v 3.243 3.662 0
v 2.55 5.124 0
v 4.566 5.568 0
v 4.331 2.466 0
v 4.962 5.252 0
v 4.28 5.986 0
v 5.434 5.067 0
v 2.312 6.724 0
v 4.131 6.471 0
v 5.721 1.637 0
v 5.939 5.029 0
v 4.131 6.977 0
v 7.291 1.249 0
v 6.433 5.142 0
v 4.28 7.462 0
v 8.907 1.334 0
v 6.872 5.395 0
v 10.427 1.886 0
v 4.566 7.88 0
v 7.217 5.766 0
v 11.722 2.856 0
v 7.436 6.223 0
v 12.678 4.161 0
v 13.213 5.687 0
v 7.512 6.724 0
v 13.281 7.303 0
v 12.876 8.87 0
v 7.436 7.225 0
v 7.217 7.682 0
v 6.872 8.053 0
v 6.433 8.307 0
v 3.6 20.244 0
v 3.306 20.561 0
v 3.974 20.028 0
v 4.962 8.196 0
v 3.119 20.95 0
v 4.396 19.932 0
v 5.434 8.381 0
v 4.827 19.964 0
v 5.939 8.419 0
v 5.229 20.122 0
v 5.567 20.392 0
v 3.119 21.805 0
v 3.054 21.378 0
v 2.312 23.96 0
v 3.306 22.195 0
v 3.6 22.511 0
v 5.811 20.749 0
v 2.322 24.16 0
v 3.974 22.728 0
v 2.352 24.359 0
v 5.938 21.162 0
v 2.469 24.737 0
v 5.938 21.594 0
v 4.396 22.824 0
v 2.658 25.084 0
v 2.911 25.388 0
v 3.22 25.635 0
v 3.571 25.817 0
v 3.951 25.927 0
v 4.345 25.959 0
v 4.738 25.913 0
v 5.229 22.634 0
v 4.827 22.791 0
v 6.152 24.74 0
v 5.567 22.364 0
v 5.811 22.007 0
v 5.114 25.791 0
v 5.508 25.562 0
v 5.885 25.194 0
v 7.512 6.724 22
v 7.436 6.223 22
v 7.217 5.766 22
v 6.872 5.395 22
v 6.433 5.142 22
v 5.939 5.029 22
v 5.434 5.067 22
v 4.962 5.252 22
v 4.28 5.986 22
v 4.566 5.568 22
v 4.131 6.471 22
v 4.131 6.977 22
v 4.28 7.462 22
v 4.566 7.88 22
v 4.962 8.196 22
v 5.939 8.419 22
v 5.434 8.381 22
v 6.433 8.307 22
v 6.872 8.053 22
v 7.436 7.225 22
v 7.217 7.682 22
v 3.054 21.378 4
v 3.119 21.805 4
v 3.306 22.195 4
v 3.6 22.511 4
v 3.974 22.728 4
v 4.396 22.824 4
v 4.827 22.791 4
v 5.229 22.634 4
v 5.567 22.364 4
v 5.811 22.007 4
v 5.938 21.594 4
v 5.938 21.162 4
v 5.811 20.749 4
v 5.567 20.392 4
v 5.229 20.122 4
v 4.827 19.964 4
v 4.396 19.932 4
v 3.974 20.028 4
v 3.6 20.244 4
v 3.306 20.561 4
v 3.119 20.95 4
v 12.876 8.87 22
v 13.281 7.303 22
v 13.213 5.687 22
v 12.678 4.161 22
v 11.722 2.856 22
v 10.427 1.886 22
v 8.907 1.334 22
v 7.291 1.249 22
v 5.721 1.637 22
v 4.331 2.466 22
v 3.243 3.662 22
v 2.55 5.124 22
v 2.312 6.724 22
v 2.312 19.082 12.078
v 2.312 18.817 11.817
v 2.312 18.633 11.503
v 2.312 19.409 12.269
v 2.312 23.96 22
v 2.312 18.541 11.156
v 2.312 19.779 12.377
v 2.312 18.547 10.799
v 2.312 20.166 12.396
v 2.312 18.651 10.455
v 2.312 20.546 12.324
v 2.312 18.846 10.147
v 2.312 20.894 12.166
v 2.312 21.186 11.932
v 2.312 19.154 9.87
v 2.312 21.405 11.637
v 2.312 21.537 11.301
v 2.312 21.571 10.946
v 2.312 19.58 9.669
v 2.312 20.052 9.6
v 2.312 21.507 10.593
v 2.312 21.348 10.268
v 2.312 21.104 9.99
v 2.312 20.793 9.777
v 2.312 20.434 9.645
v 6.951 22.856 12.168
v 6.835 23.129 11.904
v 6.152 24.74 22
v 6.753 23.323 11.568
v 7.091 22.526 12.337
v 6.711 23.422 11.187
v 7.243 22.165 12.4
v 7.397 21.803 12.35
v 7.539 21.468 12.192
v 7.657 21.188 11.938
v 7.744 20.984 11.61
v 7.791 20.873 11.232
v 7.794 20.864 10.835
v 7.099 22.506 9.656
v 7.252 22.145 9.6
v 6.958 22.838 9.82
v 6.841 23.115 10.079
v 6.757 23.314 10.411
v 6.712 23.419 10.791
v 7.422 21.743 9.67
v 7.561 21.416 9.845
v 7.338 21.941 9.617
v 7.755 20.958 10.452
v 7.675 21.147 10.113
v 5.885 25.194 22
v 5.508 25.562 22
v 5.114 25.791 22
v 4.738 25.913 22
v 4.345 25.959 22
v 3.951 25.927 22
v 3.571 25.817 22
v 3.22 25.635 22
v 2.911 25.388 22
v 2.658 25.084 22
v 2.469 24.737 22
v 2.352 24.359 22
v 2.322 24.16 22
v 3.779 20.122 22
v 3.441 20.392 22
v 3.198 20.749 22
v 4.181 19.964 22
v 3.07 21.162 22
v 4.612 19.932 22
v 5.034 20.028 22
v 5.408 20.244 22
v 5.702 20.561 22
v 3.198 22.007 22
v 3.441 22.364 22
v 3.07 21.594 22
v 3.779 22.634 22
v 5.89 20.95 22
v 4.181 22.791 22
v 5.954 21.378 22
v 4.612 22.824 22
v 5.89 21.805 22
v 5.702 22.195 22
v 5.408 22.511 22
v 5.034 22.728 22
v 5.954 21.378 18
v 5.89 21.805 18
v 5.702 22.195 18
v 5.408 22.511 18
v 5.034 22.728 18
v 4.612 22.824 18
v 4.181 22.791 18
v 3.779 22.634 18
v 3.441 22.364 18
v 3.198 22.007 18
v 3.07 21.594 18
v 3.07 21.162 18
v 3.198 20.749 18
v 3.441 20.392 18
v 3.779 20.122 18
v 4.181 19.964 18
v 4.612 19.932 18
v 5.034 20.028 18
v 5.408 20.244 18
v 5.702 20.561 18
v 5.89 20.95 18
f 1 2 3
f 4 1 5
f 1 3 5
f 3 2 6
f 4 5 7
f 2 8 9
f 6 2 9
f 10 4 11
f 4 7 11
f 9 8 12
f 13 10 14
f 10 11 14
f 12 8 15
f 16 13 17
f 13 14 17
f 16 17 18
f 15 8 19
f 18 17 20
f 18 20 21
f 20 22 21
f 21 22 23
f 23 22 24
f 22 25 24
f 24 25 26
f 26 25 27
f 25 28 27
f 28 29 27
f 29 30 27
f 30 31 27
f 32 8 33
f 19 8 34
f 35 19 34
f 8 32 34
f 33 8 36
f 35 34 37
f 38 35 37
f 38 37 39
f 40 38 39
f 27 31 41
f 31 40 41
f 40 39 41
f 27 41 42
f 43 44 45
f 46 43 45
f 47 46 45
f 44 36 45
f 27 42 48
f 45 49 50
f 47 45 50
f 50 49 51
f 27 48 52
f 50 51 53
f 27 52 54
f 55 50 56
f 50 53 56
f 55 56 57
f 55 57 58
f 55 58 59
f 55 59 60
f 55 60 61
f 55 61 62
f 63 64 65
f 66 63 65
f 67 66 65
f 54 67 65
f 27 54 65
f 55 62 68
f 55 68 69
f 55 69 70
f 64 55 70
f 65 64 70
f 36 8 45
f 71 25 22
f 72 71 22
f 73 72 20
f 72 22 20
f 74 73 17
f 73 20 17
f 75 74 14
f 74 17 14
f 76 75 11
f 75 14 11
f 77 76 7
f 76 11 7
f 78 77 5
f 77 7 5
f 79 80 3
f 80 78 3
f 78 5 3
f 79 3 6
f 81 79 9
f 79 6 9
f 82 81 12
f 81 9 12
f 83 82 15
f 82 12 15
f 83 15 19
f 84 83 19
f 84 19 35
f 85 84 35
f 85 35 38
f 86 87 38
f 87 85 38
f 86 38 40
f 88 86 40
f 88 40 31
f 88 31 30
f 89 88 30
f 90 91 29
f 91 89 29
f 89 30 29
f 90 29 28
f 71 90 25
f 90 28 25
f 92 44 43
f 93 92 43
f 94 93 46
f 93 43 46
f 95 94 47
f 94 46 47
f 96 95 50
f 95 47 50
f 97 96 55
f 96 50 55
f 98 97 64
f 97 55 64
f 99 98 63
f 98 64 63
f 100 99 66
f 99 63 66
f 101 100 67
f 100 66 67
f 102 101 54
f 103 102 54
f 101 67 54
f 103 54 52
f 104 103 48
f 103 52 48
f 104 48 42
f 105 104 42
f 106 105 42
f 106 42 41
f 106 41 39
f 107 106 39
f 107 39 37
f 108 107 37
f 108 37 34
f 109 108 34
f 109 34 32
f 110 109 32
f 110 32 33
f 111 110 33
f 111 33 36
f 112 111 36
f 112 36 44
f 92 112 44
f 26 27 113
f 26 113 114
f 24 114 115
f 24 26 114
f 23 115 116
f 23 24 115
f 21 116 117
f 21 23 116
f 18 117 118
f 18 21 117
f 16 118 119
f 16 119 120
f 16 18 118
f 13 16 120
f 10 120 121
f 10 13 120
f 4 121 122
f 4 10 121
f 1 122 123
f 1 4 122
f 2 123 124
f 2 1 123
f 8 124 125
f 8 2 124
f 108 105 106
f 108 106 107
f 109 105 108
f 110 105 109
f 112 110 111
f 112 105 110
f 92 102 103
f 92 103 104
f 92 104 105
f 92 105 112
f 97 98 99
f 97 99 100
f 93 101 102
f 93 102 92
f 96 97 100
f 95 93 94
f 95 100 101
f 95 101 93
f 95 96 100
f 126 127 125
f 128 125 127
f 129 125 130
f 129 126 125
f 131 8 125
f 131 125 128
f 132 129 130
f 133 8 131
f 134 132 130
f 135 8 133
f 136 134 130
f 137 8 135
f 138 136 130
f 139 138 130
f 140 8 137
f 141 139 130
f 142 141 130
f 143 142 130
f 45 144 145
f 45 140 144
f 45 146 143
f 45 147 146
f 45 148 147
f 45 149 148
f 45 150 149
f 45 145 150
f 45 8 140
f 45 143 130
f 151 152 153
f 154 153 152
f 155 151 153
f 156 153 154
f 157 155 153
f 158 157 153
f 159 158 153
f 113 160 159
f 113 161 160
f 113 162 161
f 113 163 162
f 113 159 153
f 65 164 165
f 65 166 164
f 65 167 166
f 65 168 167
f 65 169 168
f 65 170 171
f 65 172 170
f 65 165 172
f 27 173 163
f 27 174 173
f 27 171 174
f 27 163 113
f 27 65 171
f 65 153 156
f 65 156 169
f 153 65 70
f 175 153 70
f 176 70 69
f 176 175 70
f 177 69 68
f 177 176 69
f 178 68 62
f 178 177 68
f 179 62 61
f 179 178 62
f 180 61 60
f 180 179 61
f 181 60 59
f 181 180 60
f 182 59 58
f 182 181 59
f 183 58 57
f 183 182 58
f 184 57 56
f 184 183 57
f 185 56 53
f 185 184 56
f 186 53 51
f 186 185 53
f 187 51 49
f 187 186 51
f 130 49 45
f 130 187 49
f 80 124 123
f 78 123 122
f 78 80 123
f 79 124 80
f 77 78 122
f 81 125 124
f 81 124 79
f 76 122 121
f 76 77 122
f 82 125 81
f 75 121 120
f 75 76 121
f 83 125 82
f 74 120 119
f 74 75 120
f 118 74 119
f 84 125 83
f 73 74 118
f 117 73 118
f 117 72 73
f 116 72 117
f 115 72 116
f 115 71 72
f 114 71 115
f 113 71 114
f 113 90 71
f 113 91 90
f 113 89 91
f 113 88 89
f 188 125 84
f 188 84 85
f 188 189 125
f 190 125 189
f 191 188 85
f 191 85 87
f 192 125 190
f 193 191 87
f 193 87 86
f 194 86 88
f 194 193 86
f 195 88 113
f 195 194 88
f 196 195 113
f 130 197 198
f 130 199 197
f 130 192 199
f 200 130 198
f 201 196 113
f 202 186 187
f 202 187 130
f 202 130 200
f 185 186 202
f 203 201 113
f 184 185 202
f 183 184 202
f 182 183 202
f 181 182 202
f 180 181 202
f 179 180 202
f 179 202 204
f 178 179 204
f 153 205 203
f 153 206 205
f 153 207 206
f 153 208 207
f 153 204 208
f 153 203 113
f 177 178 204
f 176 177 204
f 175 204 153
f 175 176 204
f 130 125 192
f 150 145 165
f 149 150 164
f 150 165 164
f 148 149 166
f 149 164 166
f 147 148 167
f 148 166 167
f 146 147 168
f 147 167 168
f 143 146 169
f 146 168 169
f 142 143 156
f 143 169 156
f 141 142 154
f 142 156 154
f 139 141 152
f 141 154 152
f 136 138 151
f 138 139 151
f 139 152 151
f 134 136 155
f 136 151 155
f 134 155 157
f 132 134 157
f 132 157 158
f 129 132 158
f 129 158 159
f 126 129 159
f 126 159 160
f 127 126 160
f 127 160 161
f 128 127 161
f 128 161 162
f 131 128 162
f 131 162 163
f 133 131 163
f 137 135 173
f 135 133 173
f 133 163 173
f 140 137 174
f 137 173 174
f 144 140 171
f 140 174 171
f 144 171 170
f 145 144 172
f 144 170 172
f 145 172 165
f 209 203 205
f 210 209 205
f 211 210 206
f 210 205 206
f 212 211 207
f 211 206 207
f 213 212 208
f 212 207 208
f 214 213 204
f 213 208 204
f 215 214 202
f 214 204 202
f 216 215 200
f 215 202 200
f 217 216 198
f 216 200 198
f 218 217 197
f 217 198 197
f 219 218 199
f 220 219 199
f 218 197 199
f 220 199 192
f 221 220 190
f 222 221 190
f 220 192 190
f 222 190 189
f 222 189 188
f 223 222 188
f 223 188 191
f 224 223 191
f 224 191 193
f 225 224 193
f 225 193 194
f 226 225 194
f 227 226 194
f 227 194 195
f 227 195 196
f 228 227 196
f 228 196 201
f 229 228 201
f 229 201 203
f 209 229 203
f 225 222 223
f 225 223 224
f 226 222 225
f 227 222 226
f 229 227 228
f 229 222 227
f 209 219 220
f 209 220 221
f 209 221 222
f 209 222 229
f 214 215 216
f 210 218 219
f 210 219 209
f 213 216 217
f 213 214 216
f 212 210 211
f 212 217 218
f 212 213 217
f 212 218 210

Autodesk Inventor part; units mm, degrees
ref_plane "YZ Plane" through (0, 0, 0) normal (1, 0, 0) x (0, 1, 0)
ref_plane "XZ Plane" through (0, 0, 0) normal (0, 1, 0) x (-1, 0, 0)
ref_plane "XY Plane" through (0, 0, 0) normal (0, 0, 1) x (1, 0, 0)
sketch "Skizze1" plane through (0, 0, 0) normal (0, 0, 1) x (1, 0, 0)
  circle A0 centre (5.8119, 6.7241) radius 1.5 projected
  circle A1 centre (7.8119, 6.7241) radius 5.5
  line L0 (2.3119, 6.7241) -> (2.3119, 24.7241)
  line L1 (4.3119, 26.7241) -> (5.3119, 26.7241)
  line L2 (5.3119, 26.7241) -> (12.8762, 8.8696)
  arc A2 (4.3119, 26.7241) -> (2.3119, 24.7241) centre (4.3119, 24.7241) ccw
  circle A3 centre (5.8119, 6.7241) radius 1.7
  point P0 (0, 0)
  point P1 (2.3119, 26.7241)
  dimension "d0" = 20
  dimension "d1" = 3
  dimension "d2" = 2
  dimension "d3" = 2
  dimension "d6" = 0.2
  dimension "d14" = 11
extrude "Extrusion1" add sketch "Skizze1" along normal blind 22 contours A1 | A1 L0 A2 L1 L2
fillet "Rundung1" radius 2 1 edges at (5.3119, 26.7241, 11)
sketch "Skizze2" plane through (0, 0, 0) normal (0, 0, -1) x (-1, 0, 0)
  circle A0 centre (-5.8119, 6.7241) radius 1.7 projected
  arc A1 (-2.3119, 23.9575) -> (-6.1535, 24.7377) centre (-4.3119, 23.9575) ccw projected
  line L0 (-12.8762, 8.8696) -> (-6.1535, 24.7377) projected
  arc A2 (-12.8762, 8.8696) -> (-2.3119, 6.7241) centre (-7.8119, 6.7241) ccw projected
  line L1 (-2.3119, 23.9575) -> (-2.3119, 6.7241) projected
  circle A3 centre (-4.5041, 21.3778) radius 1.45
  point P0 (0, 0)
  dimension "d8" = 2.9
extrude "Extrusion2" cut sketch "Skizze2" against normal blind 4 contours A3
sketch "Skizze3" plane through (0, 0, 22) normal (0, 0, 1) x (1, 0, 0)
  circle A0 centre (4.5041, 21.3778) radius 1.45 projected
  point P0 (0, 0)
extrude "Extrusion3" cut sketch "Skizze3" against normal blind 4
ref_plane "Arbeitsebene1" through (50, 0, 23) normal (0, 0, -1) x (-1, 0, 0)
sketch "Skizze4" plane through (50, 0, 23) normal (0, 0, -1) x (-1, 0, 0)
  circle A0 centre (45.4959, 21.3778) radius 1.45 projected
  circle A1 centre (44.1881, 6.7241) radius 1.7 projected
  circle A2 centre (44.1881, 6.7241) radius 1.7 projected
  circle A3 centre (45.4959, 21.3778) radius 1.45 projected
  circle A4 centre (44.1881, 6.7241) radius 14.712
  circle A5 centre (29.4761, 6.7241) radius 1.45
  point P0 (50, 0)
  dimension "d13" = 2.9
sketch "Skizze5" plane through (12.8762, 8.8696, 22) normal (0.9208, 0.3901, 0) x (0, 0, -1)
  line L0 (0, 17.2334) -> (22, 17.2334) projected
  line L1 (0, 0) -> (0, 17.2334) projected
  line L2 (22, 0) -> (0, 0) projected
  line L3 (22, 0) -> (22, 17.2334) projected
  circle A0 centre (11, 14.4172) radius 1.4
  point P0 (22, -3.1439)
  dimension "d15" = 2.8
extrude "Extrusion4" cut sketch "Skizze5" against normal blind 10 contours A0
properties part number "Anglerfish_coverslipclamp_levelarm"
